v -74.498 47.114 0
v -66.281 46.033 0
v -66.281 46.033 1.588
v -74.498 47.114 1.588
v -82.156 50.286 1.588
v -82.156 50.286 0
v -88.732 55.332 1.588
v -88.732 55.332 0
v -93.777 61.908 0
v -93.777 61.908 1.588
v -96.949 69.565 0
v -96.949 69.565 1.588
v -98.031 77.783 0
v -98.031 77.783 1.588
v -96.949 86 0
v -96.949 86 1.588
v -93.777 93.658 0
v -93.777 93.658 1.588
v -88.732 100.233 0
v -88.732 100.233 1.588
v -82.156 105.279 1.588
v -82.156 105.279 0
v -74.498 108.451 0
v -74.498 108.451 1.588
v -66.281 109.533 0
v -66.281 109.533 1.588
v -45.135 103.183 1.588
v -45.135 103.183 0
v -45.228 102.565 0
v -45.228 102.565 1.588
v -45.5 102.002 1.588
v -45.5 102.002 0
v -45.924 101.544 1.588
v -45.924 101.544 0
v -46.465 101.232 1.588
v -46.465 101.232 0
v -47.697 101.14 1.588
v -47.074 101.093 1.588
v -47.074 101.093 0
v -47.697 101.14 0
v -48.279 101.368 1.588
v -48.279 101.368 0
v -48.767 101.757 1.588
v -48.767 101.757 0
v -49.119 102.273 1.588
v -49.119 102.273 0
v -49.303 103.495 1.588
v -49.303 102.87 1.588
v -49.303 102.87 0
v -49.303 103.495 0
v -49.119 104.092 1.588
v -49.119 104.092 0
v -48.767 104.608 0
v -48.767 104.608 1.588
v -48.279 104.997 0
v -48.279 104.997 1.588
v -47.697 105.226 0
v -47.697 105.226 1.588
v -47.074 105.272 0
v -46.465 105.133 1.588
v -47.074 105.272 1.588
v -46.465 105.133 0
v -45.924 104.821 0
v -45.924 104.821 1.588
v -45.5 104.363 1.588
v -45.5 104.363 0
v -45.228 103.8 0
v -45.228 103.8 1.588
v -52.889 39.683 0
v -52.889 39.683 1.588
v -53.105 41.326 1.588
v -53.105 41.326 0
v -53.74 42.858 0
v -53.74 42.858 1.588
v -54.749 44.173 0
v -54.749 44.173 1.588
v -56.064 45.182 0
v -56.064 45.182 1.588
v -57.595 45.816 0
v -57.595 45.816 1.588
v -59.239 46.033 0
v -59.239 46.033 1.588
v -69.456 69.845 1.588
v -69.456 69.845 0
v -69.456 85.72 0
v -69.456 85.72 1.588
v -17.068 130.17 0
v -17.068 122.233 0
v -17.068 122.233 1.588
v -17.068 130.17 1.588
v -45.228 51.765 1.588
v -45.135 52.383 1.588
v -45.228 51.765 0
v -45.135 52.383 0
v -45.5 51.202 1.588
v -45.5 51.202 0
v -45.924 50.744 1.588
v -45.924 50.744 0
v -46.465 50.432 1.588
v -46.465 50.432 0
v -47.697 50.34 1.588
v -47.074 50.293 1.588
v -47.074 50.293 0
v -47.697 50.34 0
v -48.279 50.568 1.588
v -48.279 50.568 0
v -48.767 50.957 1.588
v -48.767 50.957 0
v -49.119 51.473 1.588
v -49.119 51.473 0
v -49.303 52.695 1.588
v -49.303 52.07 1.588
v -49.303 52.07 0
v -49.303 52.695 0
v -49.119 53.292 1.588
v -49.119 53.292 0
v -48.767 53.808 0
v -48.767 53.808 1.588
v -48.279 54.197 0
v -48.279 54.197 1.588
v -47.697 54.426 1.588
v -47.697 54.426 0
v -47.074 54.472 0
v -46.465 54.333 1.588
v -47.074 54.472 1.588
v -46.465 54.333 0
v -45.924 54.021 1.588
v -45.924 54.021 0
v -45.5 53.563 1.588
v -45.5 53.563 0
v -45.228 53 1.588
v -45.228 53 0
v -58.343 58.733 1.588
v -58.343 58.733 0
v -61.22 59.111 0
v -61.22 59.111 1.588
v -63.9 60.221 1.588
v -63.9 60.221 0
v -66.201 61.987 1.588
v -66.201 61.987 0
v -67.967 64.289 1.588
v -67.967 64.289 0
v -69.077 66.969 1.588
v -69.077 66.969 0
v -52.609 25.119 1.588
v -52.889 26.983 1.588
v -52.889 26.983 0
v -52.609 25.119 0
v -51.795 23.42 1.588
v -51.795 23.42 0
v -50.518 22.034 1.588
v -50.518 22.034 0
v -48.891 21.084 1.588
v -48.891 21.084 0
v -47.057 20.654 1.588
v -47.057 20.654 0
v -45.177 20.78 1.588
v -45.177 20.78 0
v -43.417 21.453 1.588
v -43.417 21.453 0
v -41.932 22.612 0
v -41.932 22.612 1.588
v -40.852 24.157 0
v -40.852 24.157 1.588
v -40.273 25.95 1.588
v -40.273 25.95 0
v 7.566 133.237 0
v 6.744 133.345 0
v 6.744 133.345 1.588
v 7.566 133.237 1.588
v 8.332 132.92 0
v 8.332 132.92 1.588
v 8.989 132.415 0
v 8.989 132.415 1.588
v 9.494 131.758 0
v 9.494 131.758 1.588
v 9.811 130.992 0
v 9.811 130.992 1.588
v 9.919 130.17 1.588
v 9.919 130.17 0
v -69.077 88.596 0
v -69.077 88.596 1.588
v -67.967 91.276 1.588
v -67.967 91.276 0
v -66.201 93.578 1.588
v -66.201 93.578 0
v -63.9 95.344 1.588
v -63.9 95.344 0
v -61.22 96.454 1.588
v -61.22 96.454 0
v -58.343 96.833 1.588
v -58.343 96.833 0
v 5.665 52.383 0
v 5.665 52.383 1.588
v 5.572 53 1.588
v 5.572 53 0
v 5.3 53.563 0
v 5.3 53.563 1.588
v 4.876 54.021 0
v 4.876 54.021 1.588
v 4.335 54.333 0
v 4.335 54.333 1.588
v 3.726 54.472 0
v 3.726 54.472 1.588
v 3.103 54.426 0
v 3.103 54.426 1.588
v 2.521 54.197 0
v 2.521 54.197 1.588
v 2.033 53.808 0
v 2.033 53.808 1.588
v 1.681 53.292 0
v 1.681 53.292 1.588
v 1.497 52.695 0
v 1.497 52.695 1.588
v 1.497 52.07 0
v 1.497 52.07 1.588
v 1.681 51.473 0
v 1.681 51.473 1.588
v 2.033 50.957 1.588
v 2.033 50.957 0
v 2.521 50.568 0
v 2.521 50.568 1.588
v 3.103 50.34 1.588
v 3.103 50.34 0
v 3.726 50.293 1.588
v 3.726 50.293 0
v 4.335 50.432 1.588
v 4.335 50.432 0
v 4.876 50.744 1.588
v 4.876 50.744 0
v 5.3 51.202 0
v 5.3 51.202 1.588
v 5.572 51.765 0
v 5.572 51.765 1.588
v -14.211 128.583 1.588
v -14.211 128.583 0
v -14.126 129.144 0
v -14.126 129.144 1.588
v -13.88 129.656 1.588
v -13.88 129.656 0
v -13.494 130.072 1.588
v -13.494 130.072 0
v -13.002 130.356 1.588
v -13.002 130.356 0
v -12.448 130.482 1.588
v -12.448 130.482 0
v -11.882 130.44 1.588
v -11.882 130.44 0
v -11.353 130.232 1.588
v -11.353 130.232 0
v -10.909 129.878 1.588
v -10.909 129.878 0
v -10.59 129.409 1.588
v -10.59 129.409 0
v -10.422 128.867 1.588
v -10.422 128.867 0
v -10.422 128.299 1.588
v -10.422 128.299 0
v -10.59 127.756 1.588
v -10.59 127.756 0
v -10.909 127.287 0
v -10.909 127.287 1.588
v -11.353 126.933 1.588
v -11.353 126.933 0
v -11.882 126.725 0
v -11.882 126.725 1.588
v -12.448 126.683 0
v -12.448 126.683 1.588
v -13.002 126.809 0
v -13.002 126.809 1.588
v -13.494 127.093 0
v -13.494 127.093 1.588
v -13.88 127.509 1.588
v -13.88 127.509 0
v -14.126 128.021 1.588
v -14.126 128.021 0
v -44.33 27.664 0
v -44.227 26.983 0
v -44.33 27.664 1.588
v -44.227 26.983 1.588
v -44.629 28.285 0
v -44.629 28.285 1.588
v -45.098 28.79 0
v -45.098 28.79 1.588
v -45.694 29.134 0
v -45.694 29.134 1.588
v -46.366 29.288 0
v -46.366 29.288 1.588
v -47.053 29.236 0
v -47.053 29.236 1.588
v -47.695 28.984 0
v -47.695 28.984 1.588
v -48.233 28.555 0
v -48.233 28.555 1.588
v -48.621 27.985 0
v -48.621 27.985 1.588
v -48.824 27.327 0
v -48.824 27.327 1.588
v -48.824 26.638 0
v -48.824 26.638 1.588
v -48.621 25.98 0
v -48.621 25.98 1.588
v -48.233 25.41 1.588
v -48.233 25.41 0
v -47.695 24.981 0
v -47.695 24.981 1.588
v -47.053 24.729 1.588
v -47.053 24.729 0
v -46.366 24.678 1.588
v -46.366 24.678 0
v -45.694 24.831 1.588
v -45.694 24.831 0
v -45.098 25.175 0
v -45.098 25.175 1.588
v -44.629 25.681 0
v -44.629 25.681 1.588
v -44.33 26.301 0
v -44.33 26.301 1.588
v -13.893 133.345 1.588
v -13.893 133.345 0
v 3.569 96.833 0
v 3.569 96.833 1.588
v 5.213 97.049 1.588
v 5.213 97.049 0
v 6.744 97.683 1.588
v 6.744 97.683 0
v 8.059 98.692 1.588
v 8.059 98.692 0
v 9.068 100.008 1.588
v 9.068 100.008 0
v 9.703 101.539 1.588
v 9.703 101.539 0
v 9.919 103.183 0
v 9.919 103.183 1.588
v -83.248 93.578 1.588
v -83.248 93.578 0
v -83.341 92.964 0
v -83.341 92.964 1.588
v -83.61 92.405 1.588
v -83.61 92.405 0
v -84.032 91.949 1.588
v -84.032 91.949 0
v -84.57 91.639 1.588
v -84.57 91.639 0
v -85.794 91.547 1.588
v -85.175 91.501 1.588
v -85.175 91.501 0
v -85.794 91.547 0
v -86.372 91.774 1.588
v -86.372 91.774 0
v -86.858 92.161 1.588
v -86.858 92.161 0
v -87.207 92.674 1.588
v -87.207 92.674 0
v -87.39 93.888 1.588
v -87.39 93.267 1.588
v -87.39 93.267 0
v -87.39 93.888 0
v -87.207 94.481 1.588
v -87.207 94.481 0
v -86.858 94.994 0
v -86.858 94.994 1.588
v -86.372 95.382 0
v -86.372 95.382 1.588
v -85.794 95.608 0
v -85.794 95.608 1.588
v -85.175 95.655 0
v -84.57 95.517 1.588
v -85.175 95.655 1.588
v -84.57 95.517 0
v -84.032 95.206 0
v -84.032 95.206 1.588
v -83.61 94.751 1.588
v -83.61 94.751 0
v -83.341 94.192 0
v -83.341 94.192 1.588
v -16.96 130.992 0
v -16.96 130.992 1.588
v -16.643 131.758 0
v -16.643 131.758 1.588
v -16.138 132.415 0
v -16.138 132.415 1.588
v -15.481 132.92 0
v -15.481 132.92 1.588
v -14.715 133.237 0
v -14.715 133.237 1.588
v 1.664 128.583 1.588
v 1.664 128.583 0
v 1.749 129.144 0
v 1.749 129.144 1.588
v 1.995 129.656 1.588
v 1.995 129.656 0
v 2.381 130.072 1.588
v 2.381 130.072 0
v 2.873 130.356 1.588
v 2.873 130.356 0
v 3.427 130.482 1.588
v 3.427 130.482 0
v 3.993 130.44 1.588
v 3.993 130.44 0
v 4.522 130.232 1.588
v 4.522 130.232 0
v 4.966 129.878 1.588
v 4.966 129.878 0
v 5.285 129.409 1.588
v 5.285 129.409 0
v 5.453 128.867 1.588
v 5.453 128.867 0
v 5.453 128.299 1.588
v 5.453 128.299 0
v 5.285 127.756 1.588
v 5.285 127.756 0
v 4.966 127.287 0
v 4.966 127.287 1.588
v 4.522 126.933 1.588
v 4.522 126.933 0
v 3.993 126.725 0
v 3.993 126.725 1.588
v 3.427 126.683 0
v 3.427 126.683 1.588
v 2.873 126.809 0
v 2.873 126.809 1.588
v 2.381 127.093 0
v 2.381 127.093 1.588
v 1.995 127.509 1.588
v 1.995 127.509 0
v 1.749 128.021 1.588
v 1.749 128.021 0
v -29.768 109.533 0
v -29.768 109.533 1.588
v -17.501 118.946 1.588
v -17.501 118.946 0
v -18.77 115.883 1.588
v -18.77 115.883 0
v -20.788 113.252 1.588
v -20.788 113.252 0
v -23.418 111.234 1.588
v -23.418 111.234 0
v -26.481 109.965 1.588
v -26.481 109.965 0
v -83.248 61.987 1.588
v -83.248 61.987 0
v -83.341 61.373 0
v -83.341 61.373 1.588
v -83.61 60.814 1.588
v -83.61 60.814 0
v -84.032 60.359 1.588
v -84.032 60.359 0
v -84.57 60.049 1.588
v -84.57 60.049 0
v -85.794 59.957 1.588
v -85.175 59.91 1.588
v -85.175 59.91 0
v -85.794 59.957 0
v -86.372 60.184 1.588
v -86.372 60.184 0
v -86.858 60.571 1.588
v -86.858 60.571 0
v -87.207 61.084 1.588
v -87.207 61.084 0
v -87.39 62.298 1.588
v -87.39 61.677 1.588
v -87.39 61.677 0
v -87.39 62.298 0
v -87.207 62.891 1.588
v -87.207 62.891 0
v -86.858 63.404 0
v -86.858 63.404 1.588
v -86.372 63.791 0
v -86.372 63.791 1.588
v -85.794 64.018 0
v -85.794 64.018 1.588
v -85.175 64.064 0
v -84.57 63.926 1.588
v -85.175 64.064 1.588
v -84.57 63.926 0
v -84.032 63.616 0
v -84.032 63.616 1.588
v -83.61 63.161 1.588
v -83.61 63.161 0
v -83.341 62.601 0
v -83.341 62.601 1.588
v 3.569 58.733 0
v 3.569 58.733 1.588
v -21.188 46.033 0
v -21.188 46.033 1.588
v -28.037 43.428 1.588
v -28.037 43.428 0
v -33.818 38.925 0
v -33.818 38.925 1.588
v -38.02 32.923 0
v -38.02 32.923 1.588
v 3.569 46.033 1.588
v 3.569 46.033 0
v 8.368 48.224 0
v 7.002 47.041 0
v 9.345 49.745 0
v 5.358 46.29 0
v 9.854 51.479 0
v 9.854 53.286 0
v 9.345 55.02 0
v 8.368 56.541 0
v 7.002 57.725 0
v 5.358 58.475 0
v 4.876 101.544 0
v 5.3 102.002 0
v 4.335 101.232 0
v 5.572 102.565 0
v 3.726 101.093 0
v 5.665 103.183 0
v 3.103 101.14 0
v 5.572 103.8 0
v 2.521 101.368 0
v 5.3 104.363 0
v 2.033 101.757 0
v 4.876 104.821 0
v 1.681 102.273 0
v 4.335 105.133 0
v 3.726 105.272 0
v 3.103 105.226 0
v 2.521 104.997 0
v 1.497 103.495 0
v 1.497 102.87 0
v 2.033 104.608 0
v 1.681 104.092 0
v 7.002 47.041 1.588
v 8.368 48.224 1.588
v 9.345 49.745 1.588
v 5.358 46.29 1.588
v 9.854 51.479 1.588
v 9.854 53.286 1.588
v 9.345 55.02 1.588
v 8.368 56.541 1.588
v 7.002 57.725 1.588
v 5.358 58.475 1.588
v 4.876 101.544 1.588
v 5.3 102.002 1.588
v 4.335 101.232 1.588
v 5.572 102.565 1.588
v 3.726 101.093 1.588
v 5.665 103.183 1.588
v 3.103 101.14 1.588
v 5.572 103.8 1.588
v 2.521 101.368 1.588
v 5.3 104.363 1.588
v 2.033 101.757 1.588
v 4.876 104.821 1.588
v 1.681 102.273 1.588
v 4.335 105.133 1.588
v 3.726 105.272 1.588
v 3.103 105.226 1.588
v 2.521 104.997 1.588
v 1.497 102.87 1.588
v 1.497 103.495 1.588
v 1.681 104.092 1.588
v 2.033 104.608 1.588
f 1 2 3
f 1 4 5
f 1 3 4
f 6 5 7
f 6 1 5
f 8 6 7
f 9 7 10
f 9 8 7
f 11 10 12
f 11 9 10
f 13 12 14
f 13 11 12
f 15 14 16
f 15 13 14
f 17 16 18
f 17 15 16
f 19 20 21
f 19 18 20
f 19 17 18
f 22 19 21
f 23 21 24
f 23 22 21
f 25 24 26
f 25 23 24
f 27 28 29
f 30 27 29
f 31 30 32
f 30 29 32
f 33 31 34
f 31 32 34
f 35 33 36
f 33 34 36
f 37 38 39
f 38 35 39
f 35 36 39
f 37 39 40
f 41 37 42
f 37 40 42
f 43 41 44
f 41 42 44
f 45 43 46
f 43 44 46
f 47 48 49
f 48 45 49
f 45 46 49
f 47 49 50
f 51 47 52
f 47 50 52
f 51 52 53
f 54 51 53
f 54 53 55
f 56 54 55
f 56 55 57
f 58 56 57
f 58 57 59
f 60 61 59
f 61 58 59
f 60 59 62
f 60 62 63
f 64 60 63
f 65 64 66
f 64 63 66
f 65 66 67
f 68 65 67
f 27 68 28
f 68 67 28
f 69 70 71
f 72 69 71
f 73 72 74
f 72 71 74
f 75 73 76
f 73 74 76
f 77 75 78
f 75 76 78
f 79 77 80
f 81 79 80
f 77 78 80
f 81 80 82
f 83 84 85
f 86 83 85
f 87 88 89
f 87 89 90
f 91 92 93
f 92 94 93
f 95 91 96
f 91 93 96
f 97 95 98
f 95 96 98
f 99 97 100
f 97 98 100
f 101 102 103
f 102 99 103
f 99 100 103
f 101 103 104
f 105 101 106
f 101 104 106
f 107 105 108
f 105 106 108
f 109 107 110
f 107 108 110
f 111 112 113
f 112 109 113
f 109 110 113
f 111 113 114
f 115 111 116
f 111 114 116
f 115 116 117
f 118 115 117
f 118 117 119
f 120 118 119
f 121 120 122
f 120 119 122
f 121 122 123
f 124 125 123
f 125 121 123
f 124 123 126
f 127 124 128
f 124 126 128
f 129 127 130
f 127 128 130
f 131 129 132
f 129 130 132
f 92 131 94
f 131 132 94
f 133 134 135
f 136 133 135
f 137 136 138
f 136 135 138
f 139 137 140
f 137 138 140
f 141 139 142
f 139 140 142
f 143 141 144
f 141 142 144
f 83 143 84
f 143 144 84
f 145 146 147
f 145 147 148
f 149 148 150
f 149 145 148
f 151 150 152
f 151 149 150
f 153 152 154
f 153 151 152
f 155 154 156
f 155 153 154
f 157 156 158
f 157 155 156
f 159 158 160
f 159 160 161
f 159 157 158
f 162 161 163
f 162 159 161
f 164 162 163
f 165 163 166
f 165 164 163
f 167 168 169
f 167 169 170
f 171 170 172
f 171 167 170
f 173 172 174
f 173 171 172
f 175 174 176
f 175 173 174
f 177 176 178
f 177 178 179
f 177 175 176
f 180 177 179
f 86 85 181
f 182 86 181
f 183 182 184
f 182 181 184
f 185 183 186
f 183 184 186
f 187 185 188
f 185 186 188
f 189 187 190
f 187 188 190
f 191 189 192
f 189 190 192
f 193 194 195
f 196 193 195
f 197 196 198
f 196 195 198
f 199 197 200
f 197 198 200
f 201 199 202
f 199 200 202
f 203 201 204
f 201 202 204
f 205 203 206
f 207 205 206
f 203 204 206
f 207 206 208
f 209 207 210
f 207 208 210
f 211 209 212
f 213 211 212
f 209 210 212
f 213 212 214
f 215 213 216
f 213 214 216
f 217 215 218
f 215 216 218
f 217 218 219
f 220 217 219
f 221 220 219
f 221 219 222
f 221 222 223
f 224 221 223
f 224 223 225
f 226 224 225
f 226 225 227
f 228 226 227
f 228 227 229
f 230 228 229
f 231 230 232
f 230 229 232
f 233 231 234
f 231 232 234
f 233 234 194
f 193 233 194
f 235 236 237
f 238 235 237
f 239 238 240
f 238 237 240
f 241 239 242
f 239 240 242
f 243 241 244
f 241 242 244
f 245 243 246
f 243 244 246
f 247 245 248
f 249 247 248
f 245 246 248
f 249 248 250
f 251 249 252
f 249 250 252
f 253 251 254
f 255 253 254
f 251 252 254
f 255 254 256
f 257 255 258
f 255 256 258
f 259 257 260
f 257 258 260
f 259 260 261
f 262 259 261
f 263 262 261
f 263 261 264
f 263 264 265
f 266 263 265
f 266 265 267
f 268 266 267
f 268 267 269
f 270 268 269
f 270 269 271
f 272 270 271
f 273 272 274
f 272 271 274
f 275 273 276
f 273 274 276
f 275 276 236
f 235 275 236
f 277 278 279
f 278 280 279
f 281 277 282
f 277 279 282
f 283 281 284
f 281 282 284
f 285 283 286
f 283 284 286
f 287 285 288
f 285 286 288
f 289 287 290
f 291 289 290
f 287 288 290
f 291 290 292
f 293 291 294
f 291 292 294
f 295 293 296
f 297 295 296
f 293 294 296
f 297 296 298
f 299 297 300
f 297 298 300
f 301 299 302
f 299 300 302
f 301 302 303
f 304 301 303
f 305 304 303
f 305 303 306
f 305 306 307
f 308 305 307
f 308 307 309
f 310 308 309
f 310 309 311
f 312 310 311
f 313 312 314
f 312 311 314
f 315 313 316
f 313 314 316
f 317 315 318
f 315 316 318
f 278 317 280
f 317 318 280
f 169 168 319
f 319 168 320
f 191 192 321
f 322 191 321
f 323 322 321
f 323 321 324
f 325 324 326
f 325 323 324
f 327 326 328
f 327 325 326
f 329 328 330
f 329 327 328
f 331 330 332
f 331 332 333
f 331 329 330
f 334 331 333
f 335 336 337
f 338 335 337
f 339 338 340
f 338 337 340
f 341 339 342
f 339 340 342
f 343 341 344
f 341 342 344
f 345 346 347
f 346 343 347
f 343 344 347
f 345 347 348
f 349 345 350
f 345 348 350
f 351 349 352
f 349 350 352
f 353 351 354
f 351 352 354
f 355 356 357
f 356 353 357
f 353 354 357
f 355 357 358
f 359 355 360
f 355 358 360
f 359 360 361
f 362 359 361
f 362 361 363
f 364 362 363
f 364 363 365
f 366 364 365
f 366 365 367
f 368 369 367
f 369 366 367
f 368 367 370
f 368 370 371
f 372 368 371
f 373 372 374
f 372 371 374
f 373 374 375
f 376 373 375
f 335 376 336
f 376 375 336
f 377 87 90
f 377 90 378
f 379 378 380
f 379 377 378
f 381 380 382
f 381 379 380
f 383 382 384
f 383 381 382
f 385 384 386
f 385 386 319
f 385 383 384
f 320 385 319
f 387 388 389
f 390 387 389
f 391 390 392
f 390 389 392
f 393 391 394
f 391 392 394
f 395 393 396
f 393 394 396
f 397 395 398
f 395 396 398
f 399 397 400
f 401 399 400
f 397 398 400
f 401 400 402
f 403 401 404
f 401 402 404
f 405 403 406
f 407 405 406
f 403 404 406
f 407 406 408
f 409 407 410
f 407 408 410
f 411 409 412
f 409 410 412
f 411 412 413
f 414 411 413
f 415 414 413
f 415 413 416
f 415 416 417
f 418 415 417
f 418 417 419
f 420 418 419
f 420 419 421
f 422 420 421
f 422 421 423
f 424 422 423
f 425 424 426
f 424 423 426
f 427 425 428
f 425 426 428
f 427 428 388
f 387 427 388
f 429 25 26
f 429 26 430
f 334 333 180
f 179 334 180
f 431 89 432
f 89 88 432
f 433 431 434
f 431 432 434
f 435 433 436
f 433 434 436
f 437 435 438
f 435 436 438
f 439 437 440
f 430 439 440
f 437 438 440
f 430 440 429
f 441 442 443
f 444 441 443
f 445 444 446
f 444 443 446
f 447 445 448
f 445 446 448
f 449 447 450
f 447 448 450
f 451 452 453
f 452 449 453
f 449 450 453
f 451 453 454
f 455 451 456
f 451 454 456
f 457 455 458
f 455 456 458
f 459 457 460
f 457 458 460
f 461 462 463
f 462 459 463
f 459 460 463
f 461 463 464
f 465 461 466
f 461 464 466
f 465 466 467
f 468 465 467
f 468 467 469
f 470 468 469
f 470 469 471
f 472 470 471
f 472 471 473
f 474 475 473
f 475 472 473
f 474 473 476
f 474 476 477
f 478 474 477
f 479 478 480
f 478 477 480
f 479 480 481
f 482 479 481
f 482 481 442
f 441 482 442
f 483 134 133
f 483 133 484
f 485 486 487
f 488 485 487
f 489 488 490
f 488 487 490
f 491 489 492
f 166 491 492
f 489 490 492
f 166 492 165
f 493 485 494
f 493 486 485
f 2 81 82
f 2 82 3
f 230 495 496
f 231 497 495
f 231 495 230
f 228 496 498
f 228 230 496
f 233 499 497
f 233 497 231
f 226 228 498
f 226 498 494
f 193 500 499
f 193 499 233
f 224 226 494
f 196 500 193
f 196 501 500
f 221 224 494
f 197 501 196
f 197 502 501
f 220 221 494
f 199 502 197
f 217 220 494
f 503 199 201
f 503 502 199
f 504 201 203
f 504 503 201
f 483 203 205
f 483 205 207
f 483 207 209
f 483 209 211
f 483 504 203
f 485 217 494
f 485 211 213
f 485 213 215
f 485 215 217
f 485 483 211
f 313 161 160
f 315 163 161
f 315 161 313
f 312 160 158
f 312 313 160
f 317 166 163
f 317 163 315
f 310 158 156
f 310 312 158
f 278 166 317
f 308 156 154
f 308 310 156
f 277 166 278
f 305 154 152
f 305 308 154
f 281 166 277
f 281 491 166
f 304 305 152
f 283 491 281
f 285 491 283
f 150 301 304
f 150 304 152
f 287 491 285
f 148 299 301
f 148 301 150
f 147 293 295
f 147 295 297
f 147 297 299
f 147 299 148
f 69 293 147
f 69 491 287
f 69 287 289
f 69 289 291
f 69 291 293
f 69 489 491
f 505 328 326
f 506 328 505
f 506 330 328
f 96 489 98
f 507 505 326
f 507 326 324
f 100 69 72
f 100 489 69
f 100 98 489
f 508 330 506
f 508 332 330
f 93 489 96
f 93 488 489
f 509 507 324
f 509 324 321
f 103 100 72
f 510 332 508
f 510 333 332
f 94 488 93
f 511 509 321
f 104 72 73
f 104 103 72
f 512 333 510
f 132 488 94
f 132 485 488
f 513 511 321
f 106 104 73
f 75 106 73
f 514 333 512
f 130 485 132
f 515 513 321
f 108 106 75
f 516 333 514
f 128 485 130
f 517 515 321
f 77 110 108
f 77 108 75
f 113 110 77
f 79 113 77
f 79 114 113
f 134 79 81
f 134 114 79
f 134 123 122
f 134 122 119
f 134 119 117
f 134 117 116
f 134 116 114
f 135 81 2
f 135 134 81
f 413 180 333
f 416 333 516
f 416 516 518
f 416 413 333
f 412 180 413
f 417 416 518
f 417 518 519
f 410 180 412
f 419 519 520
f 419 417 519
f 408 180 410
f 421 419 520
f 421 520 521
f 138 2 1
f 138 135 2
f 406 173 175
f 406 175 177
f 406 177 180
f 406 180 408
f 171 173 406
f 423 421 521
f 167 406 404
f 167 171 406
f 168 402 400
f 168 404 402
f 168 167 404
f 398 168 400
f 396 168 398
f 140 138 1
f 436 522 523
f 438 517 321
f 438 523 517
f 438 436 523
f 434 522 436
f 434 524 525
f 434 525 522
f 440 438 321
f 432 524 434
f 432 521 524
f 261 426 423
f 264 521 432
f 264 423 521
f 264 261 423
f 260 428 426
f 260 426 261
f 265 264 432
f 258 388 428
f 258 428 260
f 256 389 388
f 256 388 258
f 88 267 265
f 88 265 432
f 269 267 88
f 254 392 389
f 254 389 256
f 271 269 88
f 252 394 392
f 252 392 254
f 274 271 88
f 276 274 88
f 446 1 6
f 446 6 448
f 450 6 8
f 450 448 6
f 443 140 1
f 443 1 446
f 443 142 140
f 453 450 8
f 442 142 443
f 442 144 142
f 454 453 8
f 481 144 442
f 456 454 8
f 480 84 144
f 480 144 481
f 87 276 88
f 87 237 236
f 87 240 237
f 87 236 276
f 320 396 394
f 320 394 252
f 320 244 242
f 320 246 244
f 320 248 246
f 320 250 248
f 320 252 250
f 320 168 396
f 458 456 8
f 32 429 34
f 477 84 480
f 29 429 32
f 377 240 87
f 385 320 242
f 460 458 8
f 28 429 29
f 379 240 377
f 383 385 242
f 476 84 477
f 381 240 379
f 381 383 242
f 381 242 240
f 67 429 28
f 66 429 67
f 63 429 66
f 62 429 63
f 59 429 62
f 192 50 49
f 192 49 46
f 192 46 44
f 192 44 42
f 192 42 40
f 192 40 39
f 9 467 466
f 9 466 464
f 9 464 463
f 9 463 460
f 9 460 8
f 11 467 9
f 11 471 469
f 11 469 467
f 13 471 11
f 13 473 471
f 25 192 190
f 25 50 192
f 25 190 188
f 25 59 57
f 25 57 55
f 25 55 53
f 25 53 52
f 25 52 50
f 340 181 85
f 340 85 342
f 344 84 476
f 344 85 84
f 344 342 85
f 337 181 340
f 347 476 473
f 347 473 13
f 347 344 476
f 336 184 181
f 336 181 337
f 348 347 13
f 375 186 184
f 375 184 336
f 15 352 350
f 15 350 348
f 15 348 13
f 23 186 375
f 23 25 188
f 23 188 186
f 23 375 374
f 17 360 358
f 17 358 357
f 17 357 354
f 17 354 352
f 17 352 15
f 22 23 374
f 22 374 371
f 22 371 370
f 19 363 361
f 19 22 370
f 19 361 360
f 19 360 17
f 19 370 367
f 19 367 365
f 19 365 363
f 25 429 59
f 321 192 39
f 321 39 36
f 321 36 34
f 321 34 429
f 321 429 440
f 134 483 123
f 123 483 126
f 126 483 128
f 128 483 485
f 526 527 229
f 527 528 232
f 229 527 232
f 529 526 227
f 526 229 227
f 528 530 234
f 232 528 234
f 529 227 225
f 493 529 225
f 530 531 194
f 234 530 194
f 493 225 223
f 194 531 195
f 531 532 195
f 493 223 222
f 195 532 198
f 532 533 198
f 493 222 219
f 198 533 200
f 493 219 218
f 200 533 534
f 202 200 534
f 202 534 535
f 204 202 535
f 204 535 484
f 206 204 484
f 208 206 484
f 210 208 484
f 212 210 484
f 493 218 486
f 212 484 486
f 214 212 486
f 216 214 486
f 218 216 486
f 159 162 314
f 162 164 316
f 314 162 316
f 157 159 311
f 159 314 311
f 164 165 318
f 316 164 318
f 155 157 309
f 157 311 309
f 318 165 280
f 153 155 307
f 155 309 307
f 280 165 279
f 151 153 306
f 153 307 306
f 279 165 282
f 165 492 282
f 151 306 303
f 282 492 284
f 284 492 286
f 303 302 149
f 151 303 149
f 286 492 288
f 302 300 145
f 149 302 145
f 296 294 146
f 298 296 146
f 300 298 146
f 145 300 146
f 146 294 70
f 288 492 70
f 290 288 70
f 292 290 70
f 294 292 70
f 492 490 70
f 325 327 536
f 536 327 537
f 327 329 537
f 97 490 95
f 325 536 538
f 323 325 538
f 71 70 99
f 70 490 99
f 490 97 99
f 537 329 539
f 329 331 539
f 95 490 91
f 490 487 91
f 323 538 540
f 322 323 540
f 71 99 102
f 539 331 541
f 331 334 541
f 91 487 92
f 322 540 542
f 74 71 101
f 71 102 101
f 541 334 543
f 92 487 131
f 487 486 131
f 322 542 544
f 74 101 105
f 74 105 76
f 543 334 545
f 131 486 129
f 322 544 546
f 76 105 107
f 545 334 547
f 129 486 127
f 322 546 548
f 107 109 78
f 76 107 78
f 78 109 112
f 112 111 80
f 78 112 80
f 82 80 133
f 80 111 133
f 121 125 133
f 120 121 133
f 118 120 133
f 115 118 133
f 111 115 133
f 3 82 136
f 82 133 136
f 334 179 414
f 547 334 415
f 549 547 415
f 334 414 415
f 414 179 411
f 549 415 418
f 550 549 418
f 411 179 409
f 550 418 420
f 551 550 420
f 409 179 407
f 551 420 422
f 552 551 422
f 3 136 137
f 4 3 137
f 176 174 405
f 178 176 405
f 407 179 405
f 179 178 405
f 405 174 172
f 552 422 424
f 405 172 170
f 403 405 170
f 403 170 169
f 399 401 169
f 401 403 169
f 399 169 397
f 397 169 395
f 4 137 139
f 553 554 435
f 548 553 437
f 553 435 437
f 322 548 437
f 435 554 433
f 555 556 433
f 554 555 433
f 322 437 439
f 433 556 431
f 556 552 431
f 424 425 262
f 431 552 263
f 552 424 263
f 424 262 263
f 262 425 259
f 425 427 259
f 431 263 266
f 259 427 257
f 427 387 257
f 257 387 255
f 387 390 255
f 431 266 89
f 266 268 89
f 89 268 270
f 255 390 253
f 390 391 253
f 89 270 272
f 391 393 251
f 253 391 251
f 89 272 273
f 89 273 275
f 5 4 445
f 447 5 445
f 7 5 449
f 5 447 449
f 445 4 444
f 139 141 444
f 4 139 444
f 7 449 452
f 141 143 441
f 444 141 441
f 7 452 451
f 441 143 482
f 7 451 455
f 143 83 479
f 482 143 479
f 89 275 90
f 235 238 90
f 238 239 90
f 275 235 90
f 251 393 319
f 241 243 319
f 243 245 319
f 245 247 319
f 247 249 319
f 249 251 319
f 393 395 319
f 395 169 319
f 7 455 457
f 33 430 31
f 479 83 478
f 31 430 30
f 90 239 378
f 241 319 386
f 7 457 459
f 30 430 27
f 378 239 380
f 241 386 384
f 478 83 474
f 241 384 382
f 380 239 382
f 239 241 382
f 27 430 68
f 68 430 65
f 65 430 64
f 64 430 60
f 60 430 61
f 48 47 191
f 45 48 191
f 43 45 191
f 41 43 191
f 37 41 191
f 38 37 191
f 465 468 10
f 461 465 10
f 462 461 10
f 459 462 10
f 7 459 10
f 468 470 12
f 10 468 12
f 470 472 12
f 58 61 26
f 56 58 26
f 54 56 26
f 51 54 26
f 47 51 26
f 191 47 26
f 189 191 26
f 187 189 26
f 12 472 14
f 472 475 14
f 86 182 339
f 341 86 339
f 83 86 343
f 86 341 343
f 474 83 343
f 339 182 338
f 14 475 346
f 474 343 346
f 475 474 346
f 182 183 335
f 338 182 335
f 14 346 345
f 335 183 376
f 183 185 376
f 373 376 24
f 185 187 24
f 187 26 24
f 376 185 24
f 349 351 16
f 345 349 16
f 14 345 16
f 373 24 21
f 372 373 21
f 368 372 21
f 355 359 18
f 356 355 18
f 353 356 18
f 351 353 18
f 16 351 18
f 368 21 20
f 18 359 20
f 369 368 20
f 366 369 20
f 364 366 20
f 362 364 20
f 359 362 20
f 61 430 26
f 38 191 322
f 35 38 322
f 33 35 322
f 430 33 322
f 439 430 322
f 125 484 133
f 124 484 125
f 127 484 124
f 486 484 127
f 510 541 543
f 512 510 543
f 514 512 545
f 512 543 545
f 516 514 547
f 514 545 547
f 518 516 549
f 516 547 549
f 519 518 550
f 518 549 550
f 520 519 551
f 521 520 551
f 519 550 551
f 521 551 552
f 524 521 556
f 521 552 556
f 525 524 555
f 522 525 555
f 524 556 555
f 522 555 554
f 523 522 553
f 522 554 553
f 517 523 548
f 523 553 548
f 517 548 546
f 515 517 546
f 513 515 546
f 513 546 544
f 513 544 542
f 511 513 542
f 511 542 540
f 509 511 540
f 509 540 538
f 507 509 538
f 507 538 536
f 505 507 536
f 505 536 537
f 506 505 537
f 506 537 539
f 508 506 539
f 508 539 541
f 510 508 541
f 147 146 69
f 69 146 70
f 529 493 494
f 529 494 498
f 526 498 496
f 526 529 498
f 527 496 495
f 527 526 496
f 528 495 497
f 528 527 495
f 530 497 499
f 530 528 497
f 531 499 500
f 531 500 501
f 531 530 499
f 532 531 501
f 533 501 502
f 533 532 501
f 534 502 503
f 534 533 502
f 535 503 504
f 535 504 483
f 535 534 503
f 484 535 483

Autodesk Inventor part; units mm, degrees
ref_plane "YZ Plane" through (0, 0, 0) normal (1, 0, 0) x (0, 1, 0)
ref_plane "XZ Plane" through (0, 0, 0) normal (0, 1, 0) x (-1, 0, 0)
ref_plane "XY Plane" through (0, 0, 0) normal (0, 0, 1) x (1, 0, 0)
sketch "Sketch1" plane through (0, 0, 0) normal (0, 0, 1) x (1, 0, 0)
  line L0 (-47.2309, 58.7326) -> (-58.3434, 58.7326)
  line L1 (-69.4559, 84.1326) -> (-69.4559, 69.8451)
  arc A0 (-69.4559, 69.8451) -> (-58.3434, 58.7326) centre (-58.3434, 69.8451) ccw
  line L2 (-69.4559, 69.8451) -> (-69.4559, 86.6091)
  line L3 (-47.2309, 96.8326) -> (-58.3434, 96.8326)
  line L4 (-69.4559, 85.7201) -> (-69.4559, 86.6091)
  arc A1 (-58.3434, 96.8326) -> (-69.4559, 85.7201) centre (-58.3434, 85.7201) ccw
  line L5 (-47.2309, 46.0326) -> (-66.2809, 46.0326)
  line L6 (-98.0309, 77.7826) -> (-98.0309, 77.7826)
  line L7 (-66.2809, 109.5326) -> (-47.2309, 109.5326)
  arc A2 (-66.2809, 109.5326) -> (-98.0309, 77.7826) centre (-66.2809, 77.7826) ccw
  arc A3 (-98.0309, 77.7826) -> (-66.2809, 46.0326) centre (-66.2809, 77.7826) ccw
  circle A4 centre (-47.2309, 103.1826) radius 2.0955
  circle A5 centre (-47.2309, 52.3826) radius 2.0955
  circle A6 centre (-85.3309, 93.5778) radius 2.0828
  circle A7 centre (-85.3309, 61.9874) radius 2.0828
  line L8 (-47.2309, 96.8326) -> (-21.8309, 96.8326)
  line L9 (-15.4809, 103.1826) -> (-15.4809, 103.1826)
  line L10 (-21.8309, 109.5326) -> (-47.2309, 109.5326)
  line L11 (-47.2309, 58.7326) -> (-21.8309, 58.7326)
  line L12 (-15.4809, 52.3826) -> (-15.4809, 52.3826)
  line L13 (-21.8309, 46.0326) -> (-47.2309, 46.0326)
  arc A8 (-15.4809, 52.3826) -> (-21.8309, 58.7326) centre (-21.8309, 52.3826) ccw
  arc A9 (-21.8309, 46.0326) -> (-15.4809, 52.3826) centre (-21.8309, 52.3826) ccw
  arc A10 (-21.8309, 96.8326) -> (-15.4809, 103.1826) centre (-21.8309, 103.1826) ccw
  arc A11 (-15.4809, 103.1826) -> (-21.8309, 109.5326) centre (-21.8309, 103.1826) ccw
  line L14 (-75.7109, 63.3494) -> (-75.7109, 92.2158)
  arc A12 (-76.923, 92.8904) -> (-76.923, 62.6748) centre (-67.5536, 77.7826) ccw
  arc A13 (-75.7109, 92.2158) -> (-76.923, 92.8904) centre (-76.5047, 92.2158) ccw
  arc A14 (-76.923, 62.6748) -> (-75.7109, 63.3494) centre (-76.5047, 63.3494) ccw
  point P0 (-69.4559, 58.7326)
  point P1 (-15.4809, 58.7326)
  point P2 (-75.7109, 93.5778)
  point P3 (-75.7109, 61.9874)
  dimension "d11" = 22.225
  dimension "d12" = 11.1125
  dimension "d13" = 11.1125
  dimension "d14" = 31.75
  dimension "d15" = 31.75
  dimension "d16" = 4.191
  dimension "d17" = 4.191
  dimension "d18" = 4.1656
  dimension "d19" = 4.1656
  dimension "d21" = 6.35
  dimension "d27" = 0.7937
extrude "Extrusion1" add sketch "Sketch1" along normal blind 1.5875 contours L11 A8 A9 L13 L5 A3 A2 L7 L10 A11 A10 L8 L3 A1 L2 L1 A0 L0 | A14 A12 A13 L14
sketch "Sketch2" plane through (-21.8309, 46.0326, 1.5875) normal (0, 0, 1) x (1, 0, 0)
  circle A0 centre (-24.7079, -19.05) radius 2.3114
  arc A1 (-31.0579, -19.05) -> (-18.4424, -20.0828) centre (-24.7079, -19.05) ccw
  line L0 (-31.0579, -19.05) -> (-31.0579, -6.35)
  line L1 (-44.45, 0) -> (0, 0) projected
  arc A2 (-31.0579, -6.35) -> (-37.4079, 0) centre (-37.4079, -6.35) ccw
  arc A3 (0, 0) -> (0, 12.7) centre (0, 6.35) ccw projected
  arc A4 (1.2054, 0.1155) -> (-18.4424, -20.0828) centre (5.886, -24.0929) ccw
  circle A5 centre (25.4, 6.35) radius 2.0955
  line L2 (0, 63.5) -> (-44.45, 63.5) projected
  arc A6 (0, 50.8) -> (0, 63.5) centre (0, 57.15) ccw projected
  arc A7 (25.4, 0) -> (25.4, 12.7) centre (25.4, 6.35) ccw
  line L3 (0, 12.7) -> (25.4, 12.7)
  line L4 (0, 0) -> (25.4, 0)
  circle A8 centre (25.4, 57.15) radius 2.0955
  arc A9 (25.4, 50.8) -> (25.4, 63.5) centre (25.4, 57.15) ccw
  line L5 (25.4, 50.8) -> (0, 50.8)
  line L6 (0, 63.5) -> (25.4, 63.5)
  arc A10 (0, 50.8) -> (0, 63.5) centre (0, 57.15) ccw projected
  point P0 (21.8309, -46.0326)
  point P1 (-31.0579, 0)
  point P2 (0.6434, 0)
  dimension "d22" = 4.6228
  dimension "d24" = 6.35
  dimension "d29" = 4.191
  dimension "d31" = 4.191
  dimension "d32" = 12.7
extrude "Extrusion2" add sketch "Sketch2" against normal blind 1.5875
sketch "Sketch5" plane through (3.5691, 103.1826, 0) normal (0, 0, -1) x (-1, 0, 0)
  line L0 (0, 6.35) -> (69.85, 6.35) projected
  line L1 (12.7, 0) -> (20.6375, 0) construction
  arc A0 (69.85, -57.15) -> (69.85, 6.35) centre (69.85, -25.4) ccw projected
  line L2 (69.85, 6.35) -> (50.8, 6.35)
  line L3 (0, 6.35) -> (0, 6.35)
  circle A1 centre (15.875, 25.4) radius 1.905
  arc A2 (0, 6.35) -> (0, -6.35) centre (0, 0) ccw projected
  line L4 (-6.35, 0) -> (-6.35, 26.9875)
  circle A3 centre (0, 25.4) radius 1.905
  line L5 (-3.175, 30.1625) -> (15.875, 30.1625)
  line L6 (20.6375, 19.05) -> (20.6375, 26.9875)
  line L7 (17.4625, 30.1625) -> (15.875, 30.1625)
  arc A4 (20.6375, 26.9875) -> (17.4625, 30.1625) centre (17.4625, 26.9875) ccw
  arc A5 (-3.175, 30.1625) -> (-6.35, 26.9875) centre (-3.175, 26.9875) ccw
  line L8 (33.3375, 6.35) -> (50.8, 6.35)
  arc A6 (20.6375, 19.05) -> (33.3375, 6.35) centre (33.3375, 19.05) ccw
  point P0 (3.5691, -103.1826)
  point P1 (12.7, 30.1625)
  point P2 (12.7, 6.35)
  point P3 (20.6375, 6.35)
  point P4 (33.3375, 6.35)
  dimension "d33" = 30.1625
  dimension "d37" = 3.81
  dimension "d41" = 3.81
  dimension "d42" = 3.175
  dimension "d43" = 12.7
extrude "Extrusion3" add sketch "Sketch5" against normal blind 1.5875
equation "\"BendRadius\" = Thickness"
equation "\"BendReliefWidth\" = Thickness"
equation "\"BendReliefDepth\" = 0.5 * Thickness"
equation "\"CornerReliefSize\" = 4 * Thickness"
equation "\"MinimumRemnant\" = 2 * Thickness"
equation "\"TransitionRadius\" = BendRadius"
equation "\"JacobiRadiusSize\" = BendRadius"
equation "\"GapSize\" = Thickness"
equation "\"Thickness\" = 1.5875"
properties part number "gusset" material "Acetal Resin, White"
